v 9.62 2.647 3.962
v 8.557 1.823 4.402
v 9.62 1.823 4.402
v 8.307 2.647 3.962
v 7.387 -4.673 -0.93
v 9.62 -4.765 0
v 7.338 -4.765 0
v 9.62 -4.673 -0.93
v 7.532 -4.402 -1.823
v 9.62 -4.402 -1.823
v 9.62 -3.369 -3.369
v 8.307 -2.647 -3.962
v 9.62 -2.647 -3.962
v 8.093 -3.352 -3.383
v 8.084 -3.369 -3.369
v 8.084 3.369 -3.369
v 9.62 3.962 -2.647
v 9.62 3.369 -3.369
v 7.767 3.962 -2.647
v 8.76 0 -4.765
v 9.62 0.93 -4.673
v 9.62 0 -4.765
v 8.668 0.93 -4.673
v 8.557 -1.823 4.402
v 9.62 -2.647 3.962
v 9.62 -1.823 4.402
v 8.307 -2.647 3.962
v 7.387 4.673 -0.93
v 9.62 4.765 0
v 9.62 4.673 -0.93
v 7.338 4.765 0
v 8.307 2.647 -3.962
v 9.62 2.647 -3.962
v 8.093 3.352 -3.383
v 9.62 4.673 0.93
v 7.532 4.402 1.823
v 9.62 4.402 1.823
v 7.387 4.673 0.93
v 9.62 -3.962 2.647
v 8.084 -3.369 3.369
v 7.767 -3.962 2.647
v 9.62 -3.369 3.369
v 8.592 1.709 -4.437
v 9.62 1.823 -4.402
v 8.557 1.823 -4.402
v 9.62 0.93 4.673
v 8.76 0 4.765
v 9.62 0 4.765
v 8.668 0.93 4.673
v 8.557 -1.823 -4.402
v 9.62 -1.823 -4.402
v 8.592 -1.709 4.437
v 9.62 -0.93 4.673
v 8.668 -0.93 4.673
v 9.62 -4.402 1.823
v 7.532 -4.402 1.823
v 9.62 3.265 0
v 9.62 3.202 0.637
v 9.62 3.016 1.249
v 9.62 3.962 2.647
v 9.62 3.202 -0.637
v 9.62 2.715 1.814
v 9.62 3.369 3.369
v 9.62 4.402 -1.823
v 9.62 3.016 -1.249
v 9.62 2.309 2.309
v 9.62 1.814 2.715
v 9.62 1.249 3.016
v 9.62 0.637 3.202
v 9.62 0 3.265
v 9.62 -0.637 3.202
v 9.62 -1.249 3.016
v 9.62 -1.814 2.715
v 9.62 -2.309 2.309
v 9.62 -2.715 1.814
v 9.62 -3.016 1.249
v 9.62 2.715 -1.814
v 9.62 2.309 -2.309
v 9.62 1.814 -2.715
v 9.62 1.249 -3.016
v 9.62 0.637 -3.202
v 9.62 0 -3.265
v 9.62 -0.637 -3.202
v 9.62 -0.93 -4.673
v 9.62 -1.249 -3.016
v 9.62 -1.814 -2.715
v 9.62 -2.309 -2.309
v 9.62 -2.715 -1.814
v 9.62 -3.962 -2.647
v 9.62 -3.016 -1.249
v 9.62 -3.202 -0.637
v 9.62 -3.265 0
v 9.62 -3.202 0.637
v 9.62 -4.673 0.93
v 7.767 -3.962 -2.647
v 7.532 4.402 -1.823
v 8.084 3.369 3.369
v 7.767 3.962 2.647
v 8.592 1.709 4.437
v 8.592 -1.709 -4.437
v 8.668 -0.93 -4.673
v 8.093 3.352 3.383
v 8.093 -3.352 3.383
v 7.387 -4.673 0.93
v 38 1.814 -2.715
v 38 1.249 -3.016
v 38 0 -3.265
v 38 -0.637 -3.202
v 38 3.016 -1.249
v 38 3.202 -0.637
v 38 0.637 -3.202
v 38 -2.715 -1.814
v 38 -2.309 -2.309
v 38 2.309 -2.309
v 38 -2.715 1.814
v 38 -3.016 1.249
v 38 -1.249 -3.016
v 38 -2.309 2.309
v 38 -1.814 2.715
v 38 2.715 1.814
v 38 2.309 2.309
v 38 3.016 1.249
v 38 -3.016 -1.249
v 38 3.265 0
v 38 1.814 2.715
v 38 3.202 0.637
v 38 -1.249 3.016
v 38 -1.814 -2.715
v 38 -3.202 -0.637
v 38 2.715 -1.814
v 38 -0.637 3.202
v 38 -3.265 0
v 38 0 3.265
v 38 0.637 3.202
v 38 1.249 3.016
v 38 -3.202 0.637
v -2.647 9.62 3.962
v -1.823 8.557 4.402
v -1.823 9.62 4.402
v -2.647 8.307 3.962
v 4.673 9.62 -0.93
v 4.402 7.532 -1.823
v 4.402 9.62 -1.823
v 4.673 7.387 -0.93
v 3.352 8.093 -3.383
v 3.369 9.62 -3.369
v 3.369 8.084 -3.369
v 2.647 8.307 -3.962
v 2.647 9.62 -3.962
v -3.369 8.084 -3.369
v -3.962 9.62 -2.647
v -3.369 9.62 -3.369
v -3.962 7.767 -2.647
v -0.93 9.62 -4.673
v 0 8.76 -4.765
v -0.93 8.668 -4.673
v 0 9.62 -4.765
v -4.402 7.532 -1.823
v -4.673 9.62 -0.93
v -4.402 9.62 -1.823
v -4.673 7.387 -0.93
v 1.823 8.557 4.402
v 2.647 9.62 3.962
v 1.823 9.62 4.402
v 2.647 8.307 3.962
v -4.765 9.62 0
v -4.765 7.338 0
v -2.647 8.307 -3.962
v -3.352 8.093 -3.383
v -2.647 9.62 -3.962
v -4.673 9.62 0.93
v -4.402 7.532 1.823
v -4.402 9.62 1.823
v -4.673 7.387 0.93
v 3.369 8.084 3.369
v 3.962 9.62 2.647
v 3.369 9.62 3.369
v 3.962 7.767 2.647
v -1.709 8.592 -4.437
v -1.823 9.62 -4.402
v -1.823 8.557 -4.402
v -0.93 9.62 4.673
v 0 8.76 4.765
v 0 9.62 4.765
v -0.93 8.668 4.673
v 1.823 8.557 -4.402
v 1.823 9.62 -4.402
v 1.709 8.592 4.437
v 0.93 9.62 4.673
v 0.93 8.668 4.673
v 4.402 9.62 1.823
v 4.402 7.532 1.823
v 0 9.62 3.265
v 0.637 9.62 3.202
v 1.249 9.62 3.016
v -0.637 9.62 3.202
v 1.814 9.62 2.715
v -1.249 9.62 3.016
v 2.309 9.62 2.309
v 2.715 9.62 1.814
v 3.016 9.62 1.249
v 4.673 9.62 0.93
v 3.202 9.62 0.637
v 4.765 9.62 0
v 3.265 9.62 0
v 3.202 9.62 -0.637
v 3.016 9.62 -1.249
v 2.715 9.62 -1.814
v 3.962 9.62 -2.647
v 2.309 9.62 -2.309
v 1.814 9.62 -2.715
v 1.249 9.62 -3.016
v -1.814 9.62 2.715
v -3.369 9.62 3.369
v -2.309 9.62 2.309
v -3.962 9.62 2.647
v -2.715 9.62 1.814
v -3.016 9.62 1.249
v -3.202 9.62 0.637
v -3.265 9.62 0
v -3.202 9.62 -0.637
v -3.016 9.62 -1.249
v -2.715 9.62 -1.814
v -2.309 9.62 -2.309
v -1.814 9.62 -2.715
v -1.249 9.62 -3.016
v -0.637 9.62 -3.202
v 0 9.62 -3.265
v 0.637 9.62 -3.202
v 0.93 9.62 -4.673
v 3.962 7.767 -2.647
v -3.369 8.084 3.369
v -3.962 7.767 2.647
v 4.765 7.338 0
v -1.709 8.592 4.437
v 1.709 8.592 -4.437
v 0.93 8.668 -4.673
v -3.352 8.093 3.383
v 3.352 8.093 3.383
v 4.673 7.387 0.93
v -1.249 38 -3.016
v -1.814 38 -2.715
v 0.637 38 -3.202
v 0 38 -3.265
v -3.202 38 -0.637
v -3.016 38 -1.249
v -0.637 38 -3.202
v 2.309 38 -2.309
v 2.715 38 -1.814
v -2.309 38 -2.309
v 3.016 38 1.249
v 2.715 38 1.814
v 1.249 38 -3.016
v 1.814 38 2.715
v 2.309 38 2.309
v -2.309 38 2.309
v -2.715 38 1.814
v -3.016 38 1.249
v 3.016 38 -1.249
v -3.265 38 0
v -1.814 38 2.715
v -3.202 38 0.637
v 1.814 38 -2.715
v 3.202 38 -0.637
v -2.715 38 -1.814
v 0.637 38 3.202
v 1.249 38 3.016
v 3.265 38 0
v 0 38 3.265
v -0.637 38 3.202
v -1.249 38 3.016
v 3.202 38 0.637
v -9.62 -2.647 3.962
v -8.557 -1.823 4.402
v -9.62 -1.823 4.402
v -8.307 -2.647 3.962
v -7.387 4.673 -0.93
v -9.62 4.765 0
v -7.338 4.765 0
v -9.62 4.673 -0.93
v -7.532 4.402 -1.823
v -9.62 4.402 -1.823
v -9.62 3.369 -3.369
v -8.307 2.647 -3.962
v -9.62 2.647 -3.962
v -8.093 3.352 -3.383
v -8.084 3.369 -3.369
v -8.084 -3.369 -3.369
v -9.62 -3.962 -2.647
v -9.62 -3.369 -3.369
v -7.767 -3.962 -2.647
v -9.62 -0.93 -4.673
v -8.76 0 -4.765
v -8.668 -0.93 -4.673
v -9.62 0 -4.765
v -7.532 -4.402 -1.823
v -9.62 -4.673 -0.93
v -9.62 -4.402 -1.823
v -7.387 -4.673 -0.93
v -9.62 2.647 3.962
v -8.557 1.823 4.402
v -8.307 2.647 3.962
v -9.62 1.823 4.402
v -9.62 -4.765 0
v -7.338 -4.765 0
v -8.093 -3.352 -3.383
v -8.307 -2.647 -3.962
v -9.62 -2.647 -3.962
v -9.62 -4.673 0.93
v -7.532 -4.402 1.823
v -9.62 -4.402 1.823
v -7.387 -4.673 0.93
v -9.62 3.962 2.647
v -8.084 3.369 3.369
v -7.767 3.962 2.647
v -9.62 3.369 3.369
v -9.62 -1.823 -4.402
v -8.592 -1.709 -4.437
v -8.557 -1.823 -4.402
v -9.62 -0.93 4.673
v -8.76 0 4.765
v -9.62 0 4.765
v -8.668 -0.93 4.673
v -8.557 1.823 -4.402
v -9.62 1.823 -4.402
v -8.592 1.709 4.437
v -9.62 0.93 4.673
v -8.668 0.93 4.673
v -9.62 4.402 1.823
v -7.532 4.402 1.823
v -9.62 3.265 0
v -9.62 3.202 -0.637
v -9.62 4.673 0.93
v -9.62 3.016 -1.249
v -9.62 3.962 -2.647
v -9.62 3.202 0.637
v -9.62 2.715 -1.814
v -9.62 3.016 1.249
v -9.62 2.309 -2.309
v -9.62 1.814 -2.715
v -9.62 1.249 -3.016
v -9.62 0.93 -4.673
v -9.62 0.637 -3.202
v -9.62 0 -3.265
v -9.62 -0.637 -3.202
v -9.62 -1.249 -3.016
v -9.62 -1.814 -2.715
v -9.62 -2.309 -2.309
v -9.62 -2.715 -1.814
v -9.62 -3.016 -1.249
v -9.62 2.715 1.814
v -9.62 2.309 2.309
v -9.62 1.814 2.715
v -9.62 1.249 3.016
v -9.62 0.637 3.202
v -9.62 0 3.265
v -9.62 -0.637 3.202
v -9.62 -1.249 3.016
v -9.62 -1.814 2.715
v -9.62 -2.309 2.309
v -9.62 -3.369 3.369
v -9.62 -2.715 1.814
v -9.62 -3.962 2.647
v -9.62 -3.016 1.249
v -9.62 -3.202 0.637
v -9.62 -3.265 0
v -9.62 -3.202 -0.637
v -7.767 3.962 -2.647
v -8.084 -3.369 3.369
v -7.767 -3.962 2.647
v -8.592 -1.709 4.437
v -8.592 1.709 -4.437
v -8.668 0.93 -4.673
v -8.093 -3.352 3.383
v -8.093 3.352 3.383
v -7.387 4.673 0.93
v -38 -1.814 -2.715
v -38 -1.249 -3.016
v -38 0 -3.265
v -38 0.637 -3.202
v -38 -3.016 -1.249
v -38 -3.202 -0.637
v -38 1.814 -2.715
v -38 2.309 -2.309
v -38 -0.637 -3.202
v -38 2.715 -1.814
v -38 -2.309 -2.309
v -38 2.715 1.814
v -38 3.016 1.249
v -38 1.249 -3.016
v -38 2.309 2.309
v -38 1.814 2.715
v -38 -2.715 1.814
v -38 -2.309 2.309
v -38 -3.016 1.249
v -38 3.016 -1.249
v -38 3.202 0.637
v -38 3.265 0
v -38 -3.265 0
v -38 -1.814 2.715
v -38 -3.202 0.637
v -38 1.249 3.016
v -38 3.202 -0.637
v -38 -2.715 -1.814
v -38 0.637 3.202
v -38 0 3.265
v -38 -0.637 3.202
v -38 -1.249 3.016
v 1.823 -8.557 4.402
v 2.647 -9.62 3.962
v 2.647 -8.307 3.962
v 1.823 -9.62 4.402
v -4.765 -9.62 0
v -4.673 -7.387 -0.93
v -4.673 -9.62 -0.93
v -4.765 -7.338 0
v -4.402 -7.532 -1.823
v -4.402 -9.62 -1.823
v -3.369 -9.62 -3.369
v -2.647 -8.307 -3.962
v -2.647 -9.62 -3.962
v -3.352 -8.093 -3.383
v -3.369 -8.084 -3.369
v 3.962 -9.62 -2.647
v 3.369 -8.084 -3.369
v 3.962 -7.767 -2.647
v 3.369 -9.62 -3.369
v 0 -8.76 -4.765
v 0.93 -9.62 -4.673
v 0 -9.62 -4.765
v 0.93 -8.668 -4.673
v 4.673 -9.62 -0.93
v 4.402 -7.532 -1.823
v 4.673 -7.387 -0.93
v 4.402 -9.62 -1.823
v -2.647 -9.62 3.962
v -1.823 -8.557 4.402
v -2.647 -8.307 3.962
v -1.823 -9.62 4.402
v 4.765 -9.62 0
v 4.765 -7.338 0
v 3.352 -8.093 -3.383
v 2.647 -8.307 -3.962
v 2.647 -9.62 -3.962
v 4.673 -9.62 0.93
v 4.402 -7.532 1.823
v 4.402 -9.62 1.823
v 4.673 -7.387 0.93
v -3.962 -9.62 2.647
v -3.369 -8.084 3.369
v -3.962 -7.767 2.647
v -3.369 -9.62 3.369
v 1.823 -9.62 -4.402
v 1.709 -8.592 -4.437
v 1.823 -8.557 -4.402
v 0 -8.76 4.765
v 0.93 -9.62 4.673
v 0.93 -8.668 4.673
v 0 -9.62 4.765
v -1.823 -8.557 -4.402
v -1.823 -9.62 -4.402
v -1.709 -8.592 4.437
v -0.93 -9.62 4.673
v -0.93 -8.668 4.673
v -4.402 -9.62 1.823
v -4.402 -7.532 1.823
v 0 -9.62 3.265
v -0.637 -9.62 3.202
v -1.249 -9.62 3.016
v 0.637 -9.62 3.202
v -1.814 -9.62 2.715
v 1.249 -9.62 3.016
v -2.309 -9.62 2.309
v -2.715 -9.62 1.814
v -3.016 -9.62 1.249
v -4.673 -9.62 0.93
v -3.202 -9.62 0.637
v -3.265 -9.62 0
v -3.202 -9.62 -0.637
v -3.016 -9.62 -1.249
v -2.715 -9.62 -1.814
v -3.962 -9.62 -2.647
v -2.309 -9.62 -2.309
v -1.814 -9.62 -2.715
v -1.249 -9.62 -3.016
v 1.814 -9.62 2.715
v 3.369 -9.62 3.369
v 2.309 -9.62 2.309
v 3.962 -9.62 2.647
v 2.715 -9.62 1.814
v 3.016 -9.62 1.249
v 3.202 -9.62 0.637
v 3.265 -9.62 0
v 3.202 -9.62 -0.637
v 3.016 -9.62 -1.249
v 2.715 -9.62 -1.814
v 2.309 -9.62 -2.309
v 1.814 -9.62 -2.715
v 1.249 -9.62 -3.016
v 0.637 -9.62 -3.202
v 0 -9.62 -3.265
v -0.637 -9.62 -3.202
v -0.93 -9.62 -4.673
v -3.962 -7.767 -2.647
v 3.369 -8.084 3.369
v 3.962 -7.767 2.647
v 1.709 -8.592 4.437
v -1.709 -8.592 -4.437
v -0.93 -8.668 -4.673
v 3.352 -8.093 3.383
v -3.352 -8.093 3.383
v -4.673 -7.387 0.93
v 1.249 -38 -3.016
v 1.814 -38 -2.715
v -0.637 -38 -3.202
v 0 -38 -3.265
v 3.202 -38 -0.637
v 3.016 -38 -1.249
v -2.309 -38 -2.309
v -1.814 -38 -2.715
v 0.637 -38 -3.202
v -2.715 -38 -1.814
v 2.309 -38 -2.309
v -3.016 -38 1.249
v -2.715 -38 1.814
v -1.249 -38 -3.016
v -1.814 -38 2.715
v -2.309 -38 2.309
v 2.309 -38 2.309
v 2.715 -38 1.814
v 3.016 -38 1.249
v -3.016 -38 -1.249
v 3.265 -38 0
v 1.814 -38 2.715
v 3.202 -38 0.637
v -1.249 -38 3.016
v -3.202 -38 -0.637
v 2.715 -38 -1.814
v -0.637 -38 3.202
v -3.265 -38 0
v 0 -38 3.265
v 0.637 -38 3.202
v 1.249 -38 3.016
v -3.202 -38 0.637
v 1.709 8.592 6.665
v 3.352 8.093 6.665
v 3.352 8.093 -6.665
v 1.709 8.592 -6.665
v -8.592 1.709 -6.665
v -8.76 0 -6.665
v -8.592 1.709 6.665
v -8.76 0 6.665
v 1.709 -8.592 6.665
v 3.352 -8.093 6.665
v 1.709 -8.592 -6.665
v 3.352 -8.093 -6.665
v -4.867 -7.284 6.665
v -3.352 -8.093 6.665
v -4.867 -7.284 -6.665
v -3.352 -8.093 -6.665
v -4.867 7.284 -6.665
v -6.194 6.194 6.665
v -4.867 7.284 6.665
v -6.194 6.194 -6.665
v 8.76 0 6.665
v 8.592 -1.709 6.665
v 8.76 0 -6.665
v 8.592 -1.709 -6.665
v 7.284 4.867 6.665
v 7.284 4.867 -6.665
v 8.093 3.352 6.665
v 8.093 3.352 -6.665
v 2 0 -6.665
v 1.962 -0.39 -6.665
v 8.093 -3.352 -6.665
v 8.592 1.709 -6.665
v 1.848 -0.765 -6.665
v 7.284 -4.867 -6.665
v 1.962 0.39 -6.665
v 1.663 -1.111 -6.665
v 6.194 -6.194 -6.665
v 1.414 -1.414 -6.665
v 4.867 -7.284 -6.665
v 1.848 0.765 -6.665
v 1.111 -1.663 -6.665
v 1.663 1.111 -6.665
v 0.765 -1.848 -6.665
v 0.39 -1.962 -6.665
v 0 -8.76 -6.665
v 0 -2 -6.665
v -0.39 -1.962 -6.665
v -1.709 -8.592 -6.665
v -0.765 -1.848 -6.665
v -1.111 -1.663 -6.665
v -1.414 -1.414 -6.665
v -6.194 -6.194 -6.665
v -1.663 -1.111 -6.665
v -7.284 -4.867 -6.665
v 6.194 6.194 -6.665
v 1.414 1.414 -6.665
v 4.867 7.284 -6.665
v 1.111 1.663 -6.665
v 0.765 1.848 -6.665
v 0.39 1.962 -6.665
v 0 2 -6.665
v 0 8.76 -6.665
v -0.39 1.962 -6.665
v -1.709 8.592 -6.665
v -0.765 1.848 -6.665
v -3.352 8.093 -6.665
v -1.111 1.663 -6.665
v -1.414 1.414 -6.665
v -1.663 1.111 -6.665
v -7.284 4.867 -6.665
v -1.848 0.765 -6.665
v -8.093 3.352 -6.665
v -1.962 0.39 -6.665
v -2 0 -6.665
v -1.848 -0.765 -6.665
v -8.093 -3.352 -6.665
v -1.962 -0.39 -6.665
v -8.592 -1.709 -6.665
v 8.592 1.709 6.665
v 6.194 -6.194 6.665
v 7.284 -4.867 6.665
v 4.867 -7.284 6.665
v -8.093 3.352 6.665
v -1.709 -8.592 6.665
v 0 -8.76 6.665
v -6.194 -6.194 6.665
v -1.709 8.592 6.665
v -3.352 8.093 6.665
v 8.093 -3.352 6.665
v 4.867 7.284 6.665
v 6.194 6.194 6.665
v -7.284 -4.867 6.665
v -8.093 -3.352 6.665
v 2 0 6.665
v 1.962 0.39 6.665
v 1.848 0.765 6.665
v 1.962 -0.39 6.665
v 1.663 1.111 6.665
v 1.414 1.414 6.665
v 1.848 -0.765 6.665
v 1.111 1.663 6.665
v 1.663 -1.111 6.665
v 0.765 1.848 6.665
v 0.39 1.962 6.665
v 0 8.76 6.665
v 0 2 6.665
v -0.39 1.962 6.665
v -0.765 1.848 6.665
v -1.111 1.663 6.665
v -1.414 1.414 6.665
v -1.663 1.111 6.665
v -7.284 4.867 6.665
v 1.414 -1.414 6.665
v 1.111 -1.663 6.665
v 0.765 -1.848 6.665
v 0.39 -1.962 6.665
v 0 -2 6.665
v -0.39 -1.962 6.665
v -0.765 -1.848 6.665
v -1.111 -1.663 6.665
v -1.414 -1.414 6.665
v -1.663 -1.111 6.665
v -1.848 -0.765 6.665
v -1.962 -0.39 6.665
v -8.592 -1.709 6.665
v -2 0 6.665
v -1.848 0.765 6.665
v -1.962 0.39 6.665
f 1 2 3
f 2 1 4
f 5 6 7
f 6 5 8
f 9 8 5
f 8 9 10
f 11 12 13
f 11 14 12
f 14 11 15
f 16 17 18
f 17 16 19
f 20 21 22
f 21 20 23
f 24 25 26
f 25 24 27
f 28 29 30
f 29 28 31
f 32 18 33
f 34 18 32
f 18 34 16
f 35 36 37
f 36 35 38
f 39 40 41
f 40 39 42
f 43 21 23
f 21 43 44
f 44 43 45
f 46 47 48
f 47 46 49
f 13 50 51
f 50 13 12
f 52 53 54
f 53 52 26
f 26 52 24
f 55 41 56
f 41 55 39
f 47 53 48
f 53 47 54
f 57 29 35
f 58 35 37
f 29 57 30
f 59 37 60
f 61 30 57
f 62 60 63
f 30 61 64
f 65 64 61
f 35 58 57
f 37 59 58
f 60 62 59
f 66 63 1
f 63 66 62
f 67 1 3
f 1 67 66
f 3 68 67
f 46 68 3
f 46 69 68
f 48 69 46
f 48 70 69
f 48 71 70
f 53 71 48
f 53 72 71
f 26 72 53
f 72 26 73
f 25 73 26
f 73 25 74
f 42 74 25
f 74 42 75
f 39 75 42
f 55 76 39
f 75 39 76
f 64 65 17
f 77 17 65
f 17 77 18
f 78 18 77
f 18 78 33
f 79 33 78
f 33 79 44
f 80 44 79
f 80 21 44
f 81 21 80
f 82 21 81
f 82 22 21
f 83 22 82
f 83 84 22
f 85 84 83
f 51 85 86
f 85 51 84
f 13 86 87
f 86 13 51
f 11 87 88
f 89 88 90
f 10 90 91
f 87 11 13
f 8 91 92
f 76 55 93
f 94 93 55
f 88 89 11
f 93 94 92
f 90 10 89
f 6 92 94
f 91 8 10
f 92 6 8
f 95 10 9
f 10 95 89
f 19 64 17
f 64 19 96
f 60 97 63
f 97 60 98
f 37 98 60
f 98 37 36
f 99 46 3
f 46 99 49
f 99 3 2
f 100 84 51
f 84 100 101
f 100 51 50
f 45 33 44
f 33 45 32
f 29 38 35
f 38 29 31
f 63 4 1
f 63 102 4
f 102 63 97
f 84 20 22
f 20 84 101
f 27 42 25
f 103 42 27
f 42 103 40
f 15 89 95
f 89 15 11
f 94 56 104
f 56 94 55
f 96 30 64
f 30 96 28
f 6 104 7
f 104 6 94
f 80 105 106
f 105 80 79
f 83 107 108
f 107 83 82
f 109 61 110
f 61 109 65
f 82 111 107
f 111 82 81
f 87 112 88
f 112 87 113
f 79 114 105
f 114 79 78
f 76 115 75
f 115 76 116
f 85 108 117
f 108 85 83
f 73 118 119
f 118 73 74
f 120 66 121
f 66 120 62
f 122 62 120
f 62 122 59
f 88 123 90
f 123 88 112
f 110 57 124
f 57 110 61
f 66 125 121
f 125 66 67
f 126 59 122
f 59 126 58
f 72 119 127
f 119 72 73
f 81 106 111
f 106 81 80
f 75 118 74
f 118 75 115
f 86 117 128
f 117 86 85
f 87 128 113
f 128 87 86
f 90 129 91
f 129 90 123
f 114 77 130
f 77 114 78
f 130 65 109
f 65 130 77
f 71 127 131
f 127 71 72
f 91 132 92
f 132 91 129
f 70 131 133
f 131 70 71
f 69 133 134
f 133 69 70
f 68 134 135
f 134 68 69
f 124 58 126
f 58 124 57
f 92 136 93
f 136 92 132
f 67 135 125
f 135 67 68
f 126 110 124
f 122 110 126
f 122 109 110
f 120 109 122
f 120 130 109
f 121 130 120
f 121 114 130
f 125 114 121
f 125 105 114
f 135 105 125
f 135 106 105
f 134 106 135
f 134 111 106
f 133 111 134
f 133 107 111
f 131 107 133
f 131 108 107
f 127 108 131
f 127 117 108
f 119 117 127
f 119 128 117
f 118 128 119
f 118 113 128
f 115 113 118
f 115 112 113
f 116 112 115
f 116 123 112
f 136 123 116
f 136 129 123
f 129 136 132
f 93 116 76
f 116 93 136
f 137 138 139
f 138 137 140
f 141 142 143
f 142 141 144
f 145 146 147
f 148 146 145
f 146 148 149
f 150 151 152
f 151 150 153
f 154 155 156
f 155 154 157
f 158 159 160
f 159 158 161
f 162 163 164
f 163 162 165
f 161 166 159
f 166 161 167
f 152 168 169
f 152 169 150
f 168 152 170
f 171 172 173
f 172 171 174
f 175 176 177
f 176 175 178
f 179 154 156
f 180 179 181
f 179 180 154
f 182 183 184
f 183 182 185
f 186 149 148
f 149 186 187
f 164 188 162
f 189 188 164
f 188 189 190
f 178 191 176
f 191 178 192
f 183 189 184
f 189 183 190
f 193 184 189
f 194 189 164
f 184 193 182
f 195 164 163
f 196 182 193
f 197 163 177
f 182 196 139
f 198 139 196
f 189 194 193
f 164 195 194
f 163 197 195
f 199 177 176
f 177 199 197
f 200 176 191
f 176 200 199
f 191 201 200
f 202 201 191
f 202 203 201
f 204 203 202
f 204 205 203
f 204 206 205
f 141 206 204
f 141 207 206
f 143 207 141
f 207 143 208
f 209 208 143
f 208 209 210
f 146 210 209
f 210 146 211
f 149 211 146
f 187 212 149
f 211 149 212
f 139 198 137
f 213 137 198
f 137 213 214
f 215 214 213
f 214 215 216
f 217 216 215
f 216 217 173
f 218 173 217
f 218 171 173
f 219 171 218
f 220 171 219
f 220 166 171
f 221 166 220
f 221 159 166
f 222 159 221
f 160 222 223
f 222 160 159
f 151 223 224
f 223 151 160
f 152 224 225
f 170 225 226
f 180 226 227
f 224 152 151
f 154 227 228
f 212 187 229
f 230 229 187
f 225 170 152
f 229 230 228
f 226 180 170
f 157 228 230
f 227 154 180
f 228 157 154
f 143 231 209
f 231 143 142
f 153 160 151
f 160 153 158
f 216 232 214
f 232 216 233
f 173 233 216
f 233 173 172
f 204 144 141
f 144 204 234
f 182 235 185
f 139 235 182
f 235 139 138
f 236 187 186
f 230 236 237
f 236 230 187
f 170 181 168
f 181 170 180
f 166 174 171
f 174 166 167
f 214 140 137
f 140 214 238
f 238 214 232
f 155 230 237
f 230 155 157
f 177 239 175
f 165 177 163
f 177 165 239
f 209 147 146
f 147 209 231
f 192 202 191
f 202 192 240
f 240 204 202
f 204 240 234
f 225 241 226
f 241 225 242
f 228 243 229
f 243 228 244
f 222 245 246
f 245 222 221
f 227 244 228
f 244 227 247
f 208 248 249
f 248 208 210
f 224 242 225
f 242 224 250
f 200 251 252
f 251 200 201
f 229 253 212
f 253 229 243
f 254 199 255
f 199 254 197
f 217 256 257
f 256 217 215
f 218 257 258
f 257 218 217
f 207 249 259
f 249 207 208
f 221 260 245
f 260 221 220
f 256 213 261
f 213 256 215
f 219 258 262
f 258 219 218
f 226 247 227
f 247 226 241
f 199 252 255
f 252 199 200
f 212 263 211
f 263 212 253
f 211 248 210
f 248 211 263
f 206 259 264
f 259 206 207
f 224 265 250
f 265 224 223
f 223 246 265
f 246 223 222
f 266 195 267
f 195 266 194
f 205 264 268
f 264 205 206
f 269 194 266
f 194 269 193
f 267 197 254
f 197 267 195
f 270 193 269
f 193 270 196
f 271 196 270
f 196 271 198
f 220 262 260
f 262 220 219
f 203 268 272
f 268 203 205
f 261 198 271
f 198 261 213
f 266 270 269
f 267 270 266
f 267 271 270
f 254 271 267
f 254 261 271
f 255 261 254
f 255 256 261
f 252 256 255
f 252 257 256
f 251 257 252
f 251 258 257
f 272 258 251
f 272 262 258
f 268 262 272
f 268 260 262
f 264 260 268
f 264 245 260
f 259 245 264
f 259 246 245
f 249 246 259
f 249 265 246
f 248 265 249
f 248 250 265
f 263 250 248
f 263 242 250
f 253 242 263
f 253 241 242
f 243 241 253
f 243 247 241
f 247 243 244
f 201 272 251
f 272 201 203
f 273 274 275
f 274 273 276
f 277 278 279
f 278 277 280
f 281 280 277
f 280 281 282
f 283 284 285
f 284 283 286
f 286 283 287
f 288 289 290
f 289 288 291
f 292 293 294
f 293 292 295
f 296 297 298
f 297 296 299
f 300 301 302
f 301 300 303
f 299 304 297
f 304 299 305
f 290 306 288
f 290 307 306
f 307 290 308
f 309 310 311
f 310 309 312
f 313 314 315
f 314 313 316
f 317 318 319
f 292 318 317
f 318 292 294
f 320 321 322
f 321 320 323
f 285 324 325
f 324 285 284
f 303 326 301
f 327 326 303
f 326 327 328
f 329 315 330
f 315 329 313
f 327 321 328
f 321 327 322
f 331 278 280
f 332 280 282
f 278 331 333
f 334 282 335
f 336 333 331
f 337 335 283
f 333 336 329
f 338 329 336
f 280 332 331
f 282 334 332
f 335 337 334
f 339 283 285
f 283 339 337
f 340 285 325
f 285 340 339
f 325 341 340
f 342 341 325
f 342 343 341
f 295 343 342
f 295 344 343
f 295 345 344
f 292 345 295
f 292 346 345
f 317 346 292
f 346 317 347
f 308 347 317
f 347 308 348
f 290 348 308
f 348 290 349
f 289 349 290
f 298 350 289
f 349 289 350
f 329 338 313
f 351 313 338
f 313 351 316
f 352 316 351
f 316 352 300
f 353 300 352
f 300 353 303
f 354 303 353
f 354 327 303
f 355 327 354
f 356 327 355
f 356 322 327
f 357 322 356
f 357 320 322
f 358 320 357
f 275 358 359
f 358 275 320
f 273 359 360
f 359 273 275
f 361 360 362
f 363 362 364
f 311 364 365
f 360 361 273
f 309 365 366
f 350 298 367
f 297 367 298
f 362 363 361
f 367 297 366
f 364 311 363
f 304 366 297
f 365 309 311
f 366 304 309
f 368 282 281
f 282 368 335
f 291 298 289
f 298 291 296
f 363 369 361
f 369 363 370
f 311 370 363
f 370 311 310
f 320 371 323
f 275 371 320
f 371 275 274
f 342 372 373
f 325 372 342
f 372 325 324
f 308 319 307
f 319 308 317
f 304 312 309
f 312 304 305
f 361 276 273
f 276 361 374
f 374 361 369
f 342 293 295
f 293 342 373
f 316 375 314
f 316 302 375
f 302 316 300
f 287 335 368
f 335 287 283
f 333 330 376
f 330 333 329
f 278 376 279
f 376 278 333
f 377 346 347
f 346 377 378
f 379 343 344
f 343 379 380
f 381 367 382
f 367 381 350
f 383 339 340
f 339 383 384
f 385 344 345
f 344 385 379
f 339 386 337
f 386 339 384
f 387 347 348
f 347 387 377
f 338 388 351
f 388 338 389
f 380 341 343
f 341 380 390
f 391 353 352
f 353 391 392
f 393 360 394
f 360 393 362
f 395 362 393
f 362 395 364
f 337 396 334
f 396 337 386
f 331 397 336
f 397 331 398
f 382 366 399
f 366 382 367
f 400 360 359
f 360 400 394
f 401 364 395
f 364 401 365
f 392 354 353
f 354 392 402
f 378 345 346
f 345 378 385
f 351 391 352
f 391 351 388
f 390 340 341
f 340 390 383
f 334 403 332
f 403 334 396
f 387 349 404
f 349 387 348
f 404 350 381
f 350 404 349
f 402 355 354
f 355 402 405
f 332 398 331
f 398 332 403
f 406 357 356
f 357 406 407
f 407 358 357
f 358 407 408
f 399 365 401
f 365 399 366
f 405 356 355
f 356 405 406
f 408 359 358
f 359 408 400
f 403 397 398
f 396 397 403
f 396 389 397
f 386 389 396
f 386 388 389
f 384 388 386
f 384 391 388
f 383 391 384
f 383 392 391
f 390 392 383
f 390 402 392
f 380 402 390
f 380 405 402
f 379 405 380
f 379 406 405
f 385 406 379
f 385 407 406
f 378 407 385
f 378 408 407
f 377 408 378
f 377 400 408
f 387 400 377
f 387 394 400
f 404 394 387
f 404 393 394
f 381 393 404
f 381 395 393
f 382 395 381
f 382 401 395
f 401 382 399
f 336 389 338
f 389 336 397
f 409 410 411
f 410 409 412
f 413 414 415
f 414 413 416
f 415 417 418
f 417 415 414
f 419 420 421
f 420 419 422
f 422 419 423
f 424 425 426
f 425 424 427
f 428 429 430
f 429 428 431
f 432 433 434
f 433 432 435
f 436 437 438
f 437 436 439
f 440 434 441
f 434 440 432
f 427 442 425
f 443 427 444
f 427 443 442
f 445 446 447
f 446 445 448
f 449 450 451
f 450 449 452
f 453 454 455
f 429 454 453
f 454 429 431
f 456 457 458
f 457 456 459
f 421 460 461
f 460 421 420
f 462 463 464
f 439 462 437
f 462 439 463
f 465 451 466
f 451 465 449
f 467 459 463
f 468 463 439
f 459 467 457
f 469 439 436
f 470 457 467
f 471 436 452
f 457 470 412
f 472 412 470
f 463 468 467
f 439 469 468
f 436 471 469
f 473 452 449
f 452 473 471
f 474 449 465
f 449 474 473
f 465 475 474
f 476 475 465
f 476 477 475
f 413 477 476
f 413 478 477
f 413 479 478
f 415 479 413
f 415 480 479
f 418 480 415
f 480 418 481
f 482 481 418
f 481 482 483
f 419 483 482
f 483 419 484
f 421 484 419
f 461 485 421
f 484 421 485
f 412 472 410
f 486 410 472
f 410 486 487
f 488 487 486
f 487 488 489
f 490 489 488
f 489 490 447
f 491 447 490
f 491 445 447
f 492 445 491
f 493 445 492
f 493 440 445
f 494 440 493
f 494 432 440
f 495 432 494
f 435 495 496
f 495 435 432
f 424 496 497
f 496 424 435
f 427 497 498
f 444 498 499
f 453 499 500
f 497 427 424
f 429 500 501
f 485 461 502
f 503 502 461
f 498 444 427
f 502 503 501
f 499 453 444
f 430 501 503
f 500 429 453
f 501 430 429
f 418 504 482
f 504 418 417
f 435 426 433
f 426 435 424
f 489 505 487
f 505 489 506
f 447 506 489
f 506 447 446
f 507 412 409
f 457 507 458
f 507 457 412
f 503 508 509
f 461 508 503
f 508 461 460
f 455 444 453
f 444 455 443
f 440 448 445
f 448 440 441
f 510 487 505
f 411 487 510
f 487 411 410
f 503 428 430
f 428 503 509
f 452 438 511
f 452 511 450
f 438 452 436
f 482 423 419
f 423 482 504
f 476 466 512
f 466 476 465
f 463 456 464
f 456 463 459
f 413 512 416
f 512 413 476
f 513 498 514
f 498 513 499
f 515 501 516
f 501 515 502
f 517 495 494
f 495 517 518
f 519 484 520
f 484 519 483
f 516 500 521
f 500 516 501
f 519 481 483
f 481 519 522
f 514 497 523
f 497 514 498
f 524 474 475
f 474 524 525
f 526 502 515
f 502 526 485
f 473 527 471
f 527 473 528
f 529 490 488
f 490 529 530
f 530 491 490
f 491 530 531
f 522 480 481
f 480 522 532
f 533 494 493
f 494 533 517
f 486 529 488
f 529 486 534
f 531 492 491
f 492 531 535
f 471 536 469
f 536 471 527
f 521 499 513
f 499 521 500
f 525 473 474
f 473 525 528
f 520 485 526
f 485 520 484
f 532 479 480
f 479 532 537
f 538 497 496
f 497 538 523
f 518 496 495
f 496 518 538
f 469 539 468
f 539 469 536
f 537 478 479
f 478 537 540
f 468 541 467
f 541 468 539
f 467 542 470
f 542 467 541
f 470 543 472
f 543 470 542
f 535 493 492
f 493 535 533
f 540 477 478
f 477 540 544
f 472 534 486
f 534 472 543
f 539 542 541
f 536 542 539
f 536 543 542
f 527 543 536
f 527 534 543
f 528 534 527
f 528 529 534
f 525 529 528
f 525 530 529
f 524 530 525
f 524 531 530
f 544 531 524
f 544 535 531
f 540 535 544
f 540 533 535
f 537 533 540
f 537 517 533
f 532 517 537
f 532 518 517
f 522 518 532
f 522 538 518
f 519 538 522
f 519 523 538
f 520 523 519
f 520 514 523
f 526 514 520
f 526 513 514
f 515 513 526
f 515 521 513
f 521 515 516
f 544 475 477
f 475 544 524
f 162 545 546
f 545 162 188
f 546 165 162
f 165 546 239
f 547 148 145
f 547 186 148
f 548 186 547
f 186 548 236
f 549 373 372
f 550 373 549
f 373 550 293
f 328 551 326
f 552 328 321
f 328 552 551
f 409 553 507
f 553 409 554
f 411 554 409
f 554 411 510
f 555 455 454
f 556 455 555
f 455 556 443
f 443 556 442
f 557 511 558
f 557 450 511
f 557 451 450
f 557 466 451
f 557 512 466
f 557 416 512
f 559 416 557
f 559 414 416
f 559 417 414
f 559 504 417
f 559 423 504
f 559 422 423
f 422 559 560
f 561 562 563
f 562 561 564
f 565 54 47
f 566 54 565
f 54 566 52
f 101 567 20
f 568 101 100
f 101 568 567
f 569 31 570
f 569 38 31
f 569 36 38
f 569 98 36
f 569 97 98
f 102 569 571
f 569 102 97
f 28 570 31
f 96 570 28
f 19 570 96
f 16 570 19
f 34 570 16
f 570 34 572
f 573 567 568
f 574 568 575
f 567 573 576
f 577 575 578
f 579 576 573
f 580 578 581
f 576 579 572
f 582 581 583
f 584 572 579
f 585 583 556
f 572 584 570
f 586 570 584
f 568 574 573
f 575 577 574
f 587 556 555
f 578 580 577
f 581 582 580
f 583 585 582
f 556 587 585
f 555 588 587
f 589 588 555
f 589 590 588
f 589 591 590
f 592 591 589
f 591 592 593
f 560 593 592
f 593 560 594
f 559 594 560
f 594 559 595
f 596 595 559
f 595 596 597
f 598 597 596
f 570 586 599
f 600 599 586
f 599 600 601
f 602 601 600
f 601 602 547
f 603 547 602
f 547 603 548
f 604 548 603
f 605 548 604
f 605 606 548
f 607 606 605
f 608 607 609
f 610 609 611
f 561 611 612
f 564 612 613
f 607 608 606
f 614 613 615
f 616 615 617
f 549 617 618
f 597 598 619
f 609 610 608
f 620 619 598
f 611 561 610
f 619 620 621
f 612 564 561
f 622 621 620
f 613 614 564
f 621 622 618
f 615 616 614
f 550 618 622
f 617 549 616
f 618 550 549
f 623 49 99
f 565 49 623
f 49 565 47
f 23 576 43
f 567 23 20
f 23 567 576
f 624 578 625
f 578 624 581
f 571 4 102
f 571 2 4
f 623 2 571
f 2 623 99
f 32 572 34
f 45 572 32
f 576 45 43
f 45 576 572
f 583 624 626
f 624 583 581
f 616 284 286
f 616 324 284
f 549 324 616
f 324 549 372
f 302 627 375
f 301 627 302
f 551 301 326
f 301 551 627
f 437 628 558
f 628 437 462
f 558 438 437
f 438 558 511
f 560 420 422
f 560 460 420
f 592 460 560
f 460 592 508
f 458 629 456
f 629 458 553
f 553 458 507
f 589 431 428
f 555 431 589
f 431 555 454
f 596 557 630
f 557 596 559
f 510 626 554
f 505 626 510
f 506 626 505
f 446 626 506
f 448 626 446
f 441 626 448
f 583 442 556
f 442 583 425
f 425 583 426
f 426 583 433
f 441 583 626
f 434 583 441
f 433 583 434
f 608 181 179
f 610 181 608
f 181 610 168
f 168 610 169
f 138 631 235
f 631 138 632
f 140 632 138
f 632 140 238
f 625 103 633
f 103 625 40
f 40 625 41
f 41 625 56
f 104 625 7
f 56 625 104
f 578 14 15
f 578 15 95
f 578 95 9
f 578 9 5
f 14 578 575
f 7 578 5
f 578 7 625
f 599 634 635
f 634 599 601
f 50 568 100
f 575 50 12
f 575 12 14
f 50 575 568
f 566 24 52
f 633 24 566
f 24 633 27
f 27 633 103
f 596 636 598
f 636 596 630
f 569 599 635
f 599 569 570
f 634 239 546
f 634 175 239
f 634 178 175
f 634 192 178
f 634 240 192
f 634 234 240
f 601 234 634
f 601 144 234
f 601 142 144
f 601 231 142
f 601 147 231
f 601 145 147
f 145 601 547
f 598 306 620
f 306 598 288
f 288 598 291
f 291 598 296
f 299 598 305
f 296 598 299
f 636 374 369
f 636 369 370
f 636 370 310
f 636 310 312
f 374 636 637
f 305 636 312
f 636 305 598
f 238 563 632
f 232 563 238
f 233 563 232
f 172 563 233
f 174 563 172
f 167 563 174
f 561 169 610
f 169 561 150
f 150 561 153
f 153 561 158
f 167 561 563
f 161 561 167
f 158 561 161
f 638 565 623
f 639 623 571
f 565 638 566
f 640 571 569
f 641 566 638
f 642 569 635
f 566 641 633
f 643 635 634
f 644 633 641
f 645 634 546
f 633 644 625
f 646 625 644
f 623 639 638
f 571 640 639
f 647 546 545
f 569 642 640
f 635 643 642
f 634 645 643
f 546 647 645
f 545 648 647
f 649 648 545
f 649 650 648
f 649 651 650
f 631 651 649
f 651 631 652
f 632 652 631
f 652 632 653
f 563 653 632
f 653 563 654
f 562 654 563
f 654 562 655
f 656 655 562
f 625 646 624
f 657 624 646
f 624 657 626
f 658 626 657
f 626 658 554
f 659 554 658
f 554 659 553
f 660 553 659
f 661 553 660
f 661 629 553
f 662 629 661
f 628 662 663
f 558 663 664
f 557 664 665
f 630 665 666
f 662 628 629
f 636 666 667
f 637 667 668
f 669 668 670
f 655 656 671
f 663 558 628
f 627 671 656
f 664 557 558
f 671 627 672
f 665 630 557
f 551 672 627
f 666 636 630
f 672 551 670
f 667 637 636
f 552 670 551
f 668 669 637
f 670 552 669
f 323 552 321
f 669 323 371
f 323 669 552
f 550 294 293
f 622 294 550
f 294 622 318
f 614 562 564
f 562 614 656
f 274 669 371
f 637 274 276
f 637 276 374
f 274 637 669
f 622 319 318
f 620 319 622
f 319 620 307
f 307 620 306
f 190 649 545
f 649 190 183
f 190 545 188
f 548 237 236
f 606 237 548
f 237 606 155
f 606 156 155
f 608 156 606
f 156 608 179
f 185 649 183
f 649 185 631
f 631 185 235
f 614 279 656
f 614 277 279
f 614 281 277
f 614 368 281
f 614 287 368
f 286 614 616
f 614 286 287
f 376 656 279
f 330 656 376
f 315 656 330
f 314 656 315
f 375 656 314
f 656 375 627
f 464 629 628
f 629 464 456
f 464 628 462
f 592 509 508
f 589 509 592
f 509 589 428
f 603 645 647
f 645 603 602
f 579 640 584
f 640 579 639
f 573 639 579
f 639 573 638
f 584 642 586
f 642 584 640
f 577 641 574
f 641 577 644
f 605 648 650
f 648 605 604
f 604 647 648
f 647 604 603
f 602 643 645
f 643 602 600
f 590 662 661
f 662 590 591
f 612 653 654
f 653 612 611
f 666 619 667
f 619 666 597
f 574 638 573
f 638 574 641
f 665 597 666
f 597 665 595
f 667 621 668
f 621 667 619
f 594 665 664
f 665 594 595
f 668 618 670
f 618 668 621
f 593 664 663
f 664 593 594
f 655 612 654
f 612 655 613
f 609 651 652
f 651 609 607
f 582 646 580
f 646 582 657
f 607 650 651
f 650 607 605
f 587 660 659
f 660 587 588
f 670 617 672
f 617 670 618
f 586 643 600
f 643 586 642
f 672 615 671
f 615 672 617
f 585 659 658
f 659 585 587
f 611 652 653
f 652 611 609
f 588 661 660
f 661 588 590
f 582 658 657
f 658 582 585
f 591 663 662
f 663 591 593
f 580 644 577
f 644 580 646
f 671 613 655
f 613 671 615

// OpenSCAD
$fn = 32;

// ----------------------------------------------------------------------
// Cardan cross: 76 mm span, 9.53 mm trunnions
// ----------------------------------------------------------------------

// --- parameters (mm) ---
journal_d = 9.53;         // trunnion diameter
arm_len = 38;             // trunnion length from the centre
step_r = 3.24;            // step position from the centre
step_d = 6.53;            // journal diameter after the step
hub_d = 17.52;            // hub diameter
hub_h = 13.33;            // hub height
bore_d = 4;               // hub bore

difference() {
  union() {
    /* hub along the joint axis */
    cylinder(h = hub_h, d = hub_d, center = true);
    for (a = [0 : 90 : 270]) rotate([0, 0, a]) {
      /* trunnion, sunk into the hub */
      translate([hub_d / 4, 0, 0]) rotate([0, 90, 0]) cylinder(h = step_r + 2, d = journal_d);
      /* stepped journal out to the tip */
      translate([step_r - 0.5, 0, 0]) rotate([0, 90, 0]) cylinder(h = arm_len + 0.5 - step_r, d = step_d);
    }
  }
  /* lubrication bore through the hub, 2.5 mm clear on both sides */
  translate([0, 0, -hub_h / 2 - 2.5]) cylinder(h = hub_h + 5, d = bore_d);
}
